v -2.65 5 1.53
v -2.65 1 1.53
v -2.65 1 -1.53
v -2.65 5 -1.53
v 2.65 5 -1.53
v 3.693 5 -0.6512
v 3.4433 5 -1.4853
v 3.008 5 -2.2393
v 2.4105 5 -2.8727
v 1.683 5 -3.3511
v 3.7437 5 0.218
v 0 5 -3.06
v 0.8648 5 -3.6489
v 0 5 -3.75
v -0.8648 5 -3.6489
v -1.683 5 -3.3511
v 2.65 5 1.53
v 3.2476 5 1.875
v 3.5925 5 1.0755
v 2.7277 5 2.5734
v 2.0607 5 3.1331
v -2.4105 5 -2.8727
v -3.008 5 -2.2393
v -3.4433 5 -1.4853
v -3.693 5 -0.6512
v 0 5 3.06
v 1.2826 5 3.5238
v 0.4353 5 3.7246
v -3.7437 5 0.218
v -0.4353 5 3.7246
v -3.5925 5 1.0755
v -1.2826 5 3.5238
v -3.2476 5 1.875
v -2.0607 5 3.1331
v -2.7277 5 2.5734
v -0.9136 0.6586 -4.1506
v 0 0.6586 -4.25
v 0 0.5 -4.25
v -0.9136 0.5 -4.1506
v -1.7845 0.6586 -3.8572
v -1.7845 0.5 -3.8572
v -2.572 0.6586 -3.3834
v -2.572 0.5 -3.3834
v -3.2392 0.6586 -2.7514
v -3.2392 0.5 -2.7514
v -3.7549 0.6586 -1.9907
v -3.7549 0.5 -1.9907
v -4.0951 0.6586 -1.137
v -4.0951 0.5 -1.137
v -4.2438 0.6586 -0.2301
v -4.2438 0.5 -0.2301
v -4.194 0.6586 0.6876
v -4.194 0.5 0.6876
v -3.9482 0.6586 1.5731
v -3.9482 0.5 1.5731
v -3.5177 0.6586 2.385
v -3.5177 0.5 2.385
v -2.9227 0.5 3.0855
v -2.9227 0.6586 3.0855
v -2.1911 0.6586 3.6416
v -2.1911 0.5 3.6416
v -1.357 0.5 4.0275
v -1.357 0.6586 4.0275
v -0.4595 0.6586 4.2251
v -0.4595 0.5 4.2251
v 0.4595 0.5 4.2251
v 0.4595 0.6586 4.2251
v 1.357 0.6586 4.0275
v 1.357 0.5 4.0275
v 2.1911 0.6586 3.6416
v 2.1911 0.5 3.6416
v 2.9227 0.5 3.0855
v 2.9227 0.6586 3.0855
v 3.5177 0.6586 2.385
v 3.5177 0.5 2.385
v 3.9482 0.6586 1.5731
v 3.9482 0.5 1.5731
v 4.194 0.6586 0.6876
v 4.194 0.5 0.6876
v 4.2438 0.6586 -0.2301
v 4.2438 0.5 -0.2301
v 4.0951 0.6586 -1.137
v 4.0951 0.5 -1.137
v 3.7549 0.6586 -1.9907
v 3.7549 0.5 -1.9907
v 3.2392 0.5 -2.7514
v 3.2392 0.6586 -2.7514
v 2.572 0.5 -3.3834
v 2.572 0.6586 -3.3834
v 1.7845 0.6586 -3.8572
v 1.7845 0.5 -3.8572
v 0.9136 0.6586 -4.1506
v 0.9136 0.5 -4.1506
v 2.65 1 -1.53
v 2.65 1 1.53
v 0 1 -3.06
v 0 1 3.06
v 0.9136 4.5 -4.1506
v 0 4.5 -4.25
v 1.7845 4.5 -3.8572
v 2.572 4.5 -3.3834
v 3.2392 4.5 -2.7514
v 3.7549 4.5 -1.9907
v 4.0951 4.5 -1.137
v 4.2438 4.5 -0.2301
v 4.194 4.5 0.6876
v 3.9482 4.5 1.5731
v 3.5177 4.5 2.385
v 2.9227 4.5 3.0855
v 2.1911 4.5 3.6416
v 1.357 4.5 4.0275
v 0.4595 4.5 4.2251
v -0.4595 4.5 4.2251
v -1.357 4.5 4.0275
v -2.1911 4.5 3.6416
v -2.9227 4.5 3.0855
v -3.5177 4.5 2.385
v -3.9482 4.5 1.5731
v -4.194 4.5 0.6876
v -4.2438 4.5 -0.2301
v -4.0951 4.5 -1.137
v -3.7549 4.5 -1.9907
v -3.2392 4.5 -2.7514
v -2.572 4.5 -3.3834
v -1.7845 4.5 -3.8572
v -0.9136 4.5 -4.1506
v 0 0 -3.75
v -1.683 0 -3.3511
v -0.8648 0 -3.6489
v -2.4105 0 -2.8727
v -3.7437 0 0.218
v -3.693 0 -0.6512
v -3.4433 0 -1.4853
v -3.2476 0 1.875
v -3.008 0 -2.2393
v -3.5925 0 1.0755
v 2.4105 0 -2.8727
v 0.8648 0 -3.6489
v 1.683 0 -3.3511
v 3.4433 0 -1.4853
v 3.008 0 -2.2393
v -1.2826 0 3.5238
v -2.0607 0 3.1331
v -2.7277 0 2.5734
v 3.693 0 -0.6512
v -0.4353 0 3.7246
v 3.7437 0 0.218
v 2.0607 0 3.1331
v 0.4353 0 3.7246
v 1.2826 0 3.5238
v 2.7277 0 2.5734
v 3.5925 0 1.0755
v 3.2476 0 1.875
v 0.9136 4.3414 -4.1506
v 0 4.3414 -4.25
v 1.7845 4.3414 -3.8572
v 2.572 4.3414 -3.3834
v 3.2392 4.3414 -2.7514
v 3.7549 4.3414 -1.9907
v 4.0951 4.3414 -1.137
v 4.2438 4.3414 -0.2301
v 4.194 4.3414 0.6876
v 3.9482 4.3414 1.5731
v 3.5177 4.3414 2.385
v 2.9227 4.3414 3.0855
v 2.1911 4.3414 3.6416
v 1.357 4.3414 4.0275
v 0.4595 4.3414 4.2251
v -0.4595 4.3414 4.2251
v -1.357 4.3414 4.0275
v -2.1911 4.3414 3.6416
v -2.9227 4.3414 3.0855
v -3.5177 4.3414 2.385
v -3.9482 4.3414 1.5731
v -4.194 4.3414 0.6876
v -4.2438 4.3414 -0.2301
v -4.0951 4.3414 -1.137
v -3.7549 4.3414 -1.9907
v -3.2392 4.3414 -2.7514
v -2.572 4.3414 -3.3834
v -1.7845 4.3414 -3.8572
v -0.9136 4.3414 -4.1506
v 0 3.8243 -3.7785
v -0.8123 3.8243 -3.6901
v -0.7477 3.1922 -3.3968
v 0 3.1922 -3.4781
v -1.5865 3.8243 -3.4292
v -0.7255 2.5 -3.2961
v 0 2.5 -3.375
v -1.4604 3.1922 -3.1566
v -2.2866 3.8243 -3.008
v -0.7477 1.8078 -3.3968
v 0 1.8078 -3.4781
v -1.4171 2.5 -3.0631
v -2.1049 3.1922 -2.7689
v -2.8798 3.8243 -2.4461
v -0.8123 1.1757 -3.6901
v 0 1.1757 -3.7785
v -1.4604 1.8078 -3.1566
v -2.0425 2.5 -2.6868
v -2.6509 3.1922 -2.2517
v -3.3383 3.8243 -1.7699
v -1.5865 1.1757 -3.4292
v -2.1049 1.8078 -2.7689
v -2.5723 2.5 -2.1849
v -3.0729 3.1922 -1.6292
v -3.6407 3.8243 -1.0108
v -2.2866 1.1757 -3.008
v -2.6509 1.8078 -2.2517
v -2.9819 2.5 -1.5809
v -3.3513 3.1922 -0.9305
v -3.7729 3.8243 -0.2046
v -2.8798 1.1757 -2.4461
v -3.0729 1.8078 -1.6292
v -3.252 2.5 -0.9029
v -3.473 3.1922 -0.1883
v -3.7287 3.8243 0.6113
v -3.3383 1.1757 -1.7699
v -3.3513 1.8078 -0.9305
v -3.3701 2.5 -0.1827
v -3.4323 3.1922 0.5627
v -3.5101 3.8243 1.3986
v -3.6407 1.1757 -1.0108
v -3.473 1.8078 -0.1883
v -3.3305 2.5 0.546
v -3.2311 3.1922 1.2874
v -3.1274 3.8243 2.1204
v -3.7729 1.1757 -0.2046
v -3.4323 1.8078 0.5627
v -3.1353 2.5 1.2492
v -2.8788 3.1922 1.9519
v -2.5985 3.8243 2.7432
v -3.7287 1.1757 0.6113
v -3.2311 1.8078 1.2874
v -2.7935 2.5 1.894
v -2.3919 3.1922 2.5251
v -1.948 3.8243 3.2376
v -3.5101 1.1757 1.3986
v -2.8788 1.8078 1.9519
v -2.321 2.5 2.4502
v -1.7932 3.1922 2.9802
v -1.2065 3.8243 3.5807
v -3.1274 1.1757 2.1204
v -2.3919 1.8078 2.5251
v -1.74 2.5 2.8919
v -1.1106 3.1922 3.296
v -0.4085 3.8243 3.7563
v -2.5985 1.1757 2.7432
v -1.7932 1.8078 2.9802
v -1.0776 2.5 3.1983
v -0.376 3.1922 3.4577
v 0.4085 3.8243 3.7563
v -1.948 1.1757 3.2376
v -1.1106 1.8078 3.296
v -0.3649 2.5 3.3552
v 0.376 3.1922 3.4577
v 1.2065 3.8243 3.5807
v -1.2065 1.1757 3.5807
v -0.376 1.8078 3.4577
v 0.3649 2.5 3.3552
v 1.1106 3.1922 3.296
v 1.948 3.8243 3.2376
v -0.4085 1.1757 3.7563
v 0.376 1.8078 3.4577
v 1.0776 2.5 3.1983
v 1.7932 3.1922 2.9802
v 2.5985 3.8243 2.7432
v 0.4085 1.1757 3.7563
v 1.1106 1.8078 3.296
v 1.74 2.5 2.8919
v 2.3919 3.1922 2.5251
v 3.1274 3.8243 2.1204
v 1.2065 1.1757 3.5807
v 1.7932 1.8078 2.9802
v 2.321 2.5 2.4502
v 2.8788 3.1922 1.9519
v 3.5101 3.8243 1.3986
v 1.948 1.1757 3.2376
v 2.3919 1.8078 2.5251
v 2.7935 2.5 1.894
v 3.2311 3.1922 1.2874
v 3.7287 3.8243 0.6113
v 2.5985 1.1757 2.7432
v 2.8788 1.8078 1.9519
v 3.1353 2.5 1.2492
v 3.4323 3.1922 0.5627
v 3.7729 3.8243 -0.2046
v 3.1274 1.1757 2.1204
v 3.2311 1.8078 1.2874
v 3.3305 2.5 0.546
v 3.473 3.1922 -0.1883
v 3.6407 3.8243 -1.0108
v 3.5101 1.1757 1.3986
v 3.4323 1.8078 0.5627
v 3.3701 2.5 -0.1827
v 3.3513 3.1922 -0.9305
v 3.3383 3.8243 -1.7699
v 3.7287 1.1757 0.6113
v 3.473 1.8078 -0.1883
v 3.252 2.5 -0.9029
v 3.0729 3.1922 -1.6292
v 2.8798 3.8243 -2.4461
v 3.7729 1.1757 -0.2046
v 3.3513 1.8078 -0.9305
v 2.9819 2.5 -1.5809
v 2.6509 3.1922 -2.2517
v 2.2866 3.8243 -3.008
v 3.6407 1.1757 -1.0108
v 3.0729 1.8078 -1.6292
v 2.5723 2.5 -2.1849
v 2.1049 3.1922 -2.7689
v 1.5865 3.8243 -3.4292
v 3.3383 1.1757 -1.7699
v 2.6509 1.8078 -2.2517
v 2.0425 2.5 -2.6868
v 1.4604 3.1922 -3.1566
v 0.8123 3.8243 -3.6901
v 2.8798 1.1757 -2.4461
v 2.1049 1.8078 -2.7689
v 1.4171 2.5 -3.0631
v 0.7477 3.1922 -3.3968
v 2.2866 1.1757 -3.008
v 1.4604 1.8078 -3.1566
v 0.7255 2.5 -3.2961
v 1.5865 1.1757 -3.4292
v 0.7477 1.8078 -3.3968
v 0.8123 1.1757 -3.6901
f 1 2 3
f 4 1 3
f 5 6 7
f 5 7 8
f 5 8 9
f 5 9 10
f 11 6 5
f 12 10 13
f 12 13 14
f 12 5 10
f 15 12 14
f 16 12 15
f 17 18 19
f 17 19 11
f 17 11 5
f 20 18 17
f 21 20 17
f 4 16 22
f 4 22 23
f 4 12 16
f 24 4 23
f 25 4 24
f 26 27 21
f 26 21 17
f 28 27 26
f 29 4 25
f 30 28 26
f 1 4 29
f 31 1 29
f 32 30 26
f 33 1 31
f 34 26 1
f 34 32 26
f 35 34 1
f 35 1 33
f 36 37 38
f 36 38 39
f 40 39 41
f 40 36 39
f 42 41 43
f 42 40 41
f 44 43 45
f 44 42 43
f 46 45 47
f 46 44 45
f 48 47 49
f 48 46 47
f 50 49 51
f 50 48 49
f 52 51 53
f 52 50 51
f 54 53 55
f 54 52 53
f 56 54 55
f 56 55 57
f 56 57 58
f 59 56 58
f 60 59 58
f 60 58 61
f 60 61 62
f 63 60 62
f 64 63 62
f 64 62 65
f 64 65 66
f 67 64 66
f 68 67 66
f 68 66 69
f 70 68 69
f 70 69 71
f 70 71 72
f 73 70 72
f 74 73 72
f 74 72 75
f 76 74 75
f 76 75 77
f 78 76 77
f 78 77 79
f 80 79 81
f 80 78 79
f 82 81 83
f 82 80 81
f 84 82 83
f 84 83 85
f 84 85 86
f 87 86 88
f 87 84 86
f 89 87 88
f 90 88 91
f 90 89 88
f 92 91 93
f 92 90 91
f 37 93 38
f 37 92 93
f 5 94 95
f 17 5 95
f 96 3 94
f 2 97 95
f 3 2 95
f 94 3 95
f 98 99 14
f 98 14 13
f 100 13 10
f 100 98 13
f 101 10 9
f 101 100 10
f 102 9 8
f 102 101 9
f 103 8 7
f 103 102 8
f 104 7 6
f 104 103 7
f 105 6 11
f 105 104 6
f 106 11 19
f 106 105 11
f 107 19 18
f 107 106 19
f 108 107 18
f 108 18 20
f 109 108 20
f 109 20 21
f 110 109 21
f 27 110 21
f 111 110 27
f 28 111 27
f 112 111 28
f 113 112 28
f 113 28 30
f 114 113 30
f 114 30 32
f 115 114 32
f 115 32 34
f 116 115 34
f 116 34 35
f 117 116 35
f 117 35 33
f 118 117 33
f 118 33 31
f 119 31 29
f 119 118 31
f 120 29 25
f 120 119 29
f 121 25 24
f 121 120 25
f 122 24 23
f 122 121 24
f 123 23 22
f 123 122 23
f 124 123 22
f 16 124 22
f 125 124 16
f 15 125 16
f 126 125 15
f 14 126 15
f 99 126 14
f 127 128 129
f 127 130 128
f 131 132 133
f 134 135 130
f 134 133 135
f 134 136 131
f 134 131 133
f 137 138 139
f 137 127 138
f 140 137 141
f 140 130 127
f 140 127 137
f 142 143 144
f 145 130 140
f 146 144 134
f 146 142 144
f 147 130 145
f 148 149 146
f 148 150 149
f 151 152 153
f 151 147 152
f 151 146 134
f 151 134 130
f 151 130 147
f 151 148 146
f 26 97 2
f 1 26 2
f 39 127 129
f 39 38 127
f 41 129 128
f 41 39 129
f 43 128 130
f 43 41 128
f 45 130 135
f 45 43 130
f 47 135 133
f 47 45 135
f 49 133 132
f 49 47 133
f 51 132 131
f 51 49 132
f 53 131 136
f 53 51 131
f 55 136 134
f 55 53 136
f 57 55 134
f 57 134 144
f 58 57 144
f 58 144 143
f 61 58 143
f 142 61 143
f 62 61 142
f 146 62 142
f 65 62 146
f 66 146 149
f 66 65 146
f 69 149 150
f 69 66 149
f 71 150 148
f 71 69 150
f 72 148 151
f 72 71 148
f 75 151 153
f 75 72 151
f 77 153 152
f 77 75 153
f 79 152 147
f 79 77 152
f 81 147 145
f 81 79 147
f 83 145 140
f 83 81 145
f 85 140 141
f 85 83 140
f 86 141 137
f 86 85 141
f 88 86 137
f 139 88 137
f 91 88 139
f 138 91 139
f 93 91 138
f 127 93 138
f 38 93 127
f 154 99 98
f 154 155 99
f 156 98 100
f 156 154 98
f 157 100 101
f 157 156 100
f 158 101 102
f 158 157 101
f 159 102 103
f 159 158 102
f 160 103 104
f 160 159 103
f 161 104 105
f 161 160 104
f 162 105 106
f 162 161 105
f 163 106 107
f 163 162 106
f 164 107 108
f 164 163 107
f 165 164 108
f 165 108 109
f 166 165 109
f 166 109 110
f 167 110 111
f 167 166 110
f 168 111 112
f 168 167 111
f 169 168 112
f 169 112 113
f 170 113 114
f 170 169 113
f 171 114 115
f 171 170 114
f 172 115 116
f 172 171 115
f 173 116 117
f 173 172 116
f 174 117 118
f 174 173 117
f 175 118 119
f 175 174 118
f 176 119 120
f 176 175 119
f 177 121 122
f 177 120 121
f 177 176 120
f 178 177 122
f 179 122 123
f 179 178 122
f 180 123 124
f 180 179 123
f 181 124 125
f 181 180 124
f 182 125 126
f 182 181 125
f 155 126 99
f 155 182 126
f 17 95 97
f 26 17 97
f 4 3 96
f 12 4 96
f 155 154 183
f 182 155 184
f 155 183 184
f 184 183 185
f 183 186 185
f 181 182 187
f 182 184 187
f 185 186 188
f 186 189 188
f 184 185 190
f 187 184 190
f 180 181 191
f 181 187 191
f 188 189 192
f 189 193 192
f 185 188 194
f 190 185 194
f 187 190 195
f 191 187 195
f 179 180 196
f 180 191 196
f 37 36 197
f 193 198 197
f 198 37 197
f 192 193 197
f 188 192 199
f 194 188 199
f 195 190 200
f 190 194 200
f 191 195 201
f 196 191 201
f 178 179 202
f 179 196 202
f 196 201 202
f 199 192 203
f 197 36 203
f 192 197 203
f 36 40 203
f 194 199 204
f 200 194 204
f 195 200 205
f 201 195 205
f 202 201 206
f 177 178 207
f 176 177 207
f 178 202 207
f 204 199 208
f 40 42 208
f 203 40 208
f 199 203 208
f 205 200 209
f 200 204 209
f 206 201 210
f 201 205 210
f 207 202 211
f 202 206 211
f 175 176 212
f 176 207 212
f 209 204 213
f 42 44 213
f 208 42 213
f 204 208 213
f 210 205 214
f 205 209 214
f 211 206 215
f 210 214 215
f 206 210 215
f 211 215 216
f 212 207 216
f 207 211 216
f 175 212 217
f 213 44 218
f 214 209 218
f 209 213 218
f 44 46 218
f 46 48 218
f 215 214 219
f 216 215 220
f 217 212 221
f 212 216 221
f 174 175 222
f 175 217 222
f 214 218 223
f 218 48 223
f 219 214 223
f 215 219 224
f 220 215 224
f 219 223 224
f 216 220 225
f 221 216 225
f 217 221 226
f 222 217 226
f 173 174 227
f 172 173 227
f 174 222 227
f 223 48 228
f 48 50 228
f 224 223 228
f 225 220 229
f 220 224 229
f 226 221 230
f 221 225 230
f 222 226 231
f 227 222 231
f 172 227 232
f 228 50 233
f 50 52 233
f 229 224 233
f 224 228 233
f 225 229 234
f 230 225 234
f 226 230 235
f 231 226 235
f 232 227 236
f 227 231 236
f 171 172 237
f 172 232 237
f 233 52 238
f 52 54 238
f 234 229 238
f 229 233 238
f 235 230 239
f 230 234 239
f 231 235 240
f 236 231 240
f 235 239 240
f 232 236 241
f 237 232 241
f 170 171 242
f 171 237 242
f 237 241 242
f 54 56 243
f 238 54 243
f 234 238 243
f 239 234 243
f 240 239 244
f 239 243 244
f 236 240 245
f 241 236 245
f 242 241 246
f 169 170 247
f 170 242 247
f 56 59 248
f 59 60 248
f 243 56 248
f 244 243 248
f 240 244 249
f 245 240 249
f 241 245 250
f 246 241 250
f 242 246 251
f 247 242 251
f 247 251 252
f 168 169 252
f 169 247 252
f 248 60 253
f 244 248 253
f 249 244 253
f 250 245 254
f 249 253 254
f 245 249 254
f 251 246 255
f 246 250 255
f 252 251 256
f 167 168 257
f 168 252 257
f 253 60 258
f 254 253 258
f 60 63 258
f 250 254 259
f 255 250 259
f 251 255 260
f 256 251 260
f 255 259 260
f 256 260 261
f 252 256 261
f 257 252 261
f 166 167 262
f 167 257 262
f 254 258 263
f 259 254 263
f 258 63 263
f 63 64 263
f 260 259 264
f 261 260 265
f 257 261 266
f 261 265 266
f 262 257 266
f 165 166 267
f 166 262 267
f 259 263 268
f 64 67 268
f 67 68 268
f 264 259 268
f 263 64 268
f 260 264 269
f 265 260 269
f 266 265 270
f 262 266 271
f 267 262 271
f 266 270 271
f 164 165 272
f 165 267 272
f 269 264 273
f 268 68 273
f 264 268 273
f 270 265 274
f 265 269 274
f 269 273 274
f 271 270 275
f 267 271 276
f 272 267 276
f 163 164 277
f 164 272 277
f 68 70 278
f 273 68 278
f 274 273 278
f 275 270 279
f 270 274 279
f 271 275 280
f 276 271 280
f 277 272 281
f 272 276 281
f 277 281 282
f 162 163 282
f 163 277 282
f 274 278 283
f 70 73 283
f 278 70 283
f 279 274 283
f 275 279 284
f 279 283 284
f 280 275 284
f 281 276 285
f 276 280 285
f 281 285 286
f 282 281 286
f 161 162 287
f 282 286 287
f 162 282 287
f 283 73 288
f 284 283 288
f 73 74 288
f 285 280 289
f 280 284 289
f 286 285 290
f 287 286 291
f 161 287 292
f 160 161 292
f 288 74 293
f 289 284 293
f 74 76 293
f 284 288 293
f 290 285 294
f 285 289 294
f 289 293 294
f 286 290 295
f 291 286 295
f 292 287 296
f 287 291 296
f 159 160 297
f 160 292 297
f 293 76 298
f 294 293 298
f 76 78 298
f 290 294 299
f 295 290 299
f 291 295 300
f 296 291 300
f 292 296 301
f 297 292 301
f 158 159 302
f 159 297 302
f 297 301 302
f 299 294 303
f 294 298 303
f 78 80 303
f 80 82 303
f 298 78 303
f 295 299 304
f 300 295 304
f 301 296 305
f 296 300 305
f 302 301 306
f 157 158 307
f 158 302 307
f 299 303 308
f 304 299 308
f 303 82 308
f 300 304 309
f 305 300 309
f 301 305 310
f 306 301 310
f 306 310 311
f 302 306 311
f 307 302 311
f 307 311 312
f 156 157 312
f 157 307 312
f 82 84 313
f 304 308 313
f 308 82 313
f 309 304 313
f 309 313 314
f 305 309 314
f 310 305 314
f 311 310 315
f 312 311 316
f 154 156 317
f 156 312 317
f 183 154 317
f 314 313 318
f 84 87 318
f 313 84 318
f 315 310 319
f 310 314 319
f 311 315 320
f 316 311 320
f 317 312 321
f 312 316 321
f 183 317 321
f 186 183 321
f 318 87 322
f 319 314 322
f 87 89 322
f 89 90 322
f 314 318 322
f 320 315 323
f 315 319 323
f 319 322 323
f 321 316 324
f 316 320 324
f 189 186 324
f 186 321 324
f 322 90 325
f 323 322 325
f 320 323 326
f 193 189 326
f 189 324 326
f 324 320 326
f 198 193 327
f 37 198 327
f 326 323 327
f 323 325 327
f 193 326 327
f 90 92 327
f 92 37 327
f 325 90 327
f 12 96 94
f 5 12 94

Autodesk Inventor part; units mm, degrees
ref_plane "YZ Plane" through (0, 0, 0) normal (1, 0, 0) x (0, 1, 0)
ref_plane "XZ Plane" through (0, 0, 0) normal (0, 1, 0) x (-1, 0, 0)
sketch "Sketch1" plane through (0, 0, 0) normal (0, 1, 0) x (-1, 0, 0)
  line L0 (2.65, -1.53) -> (0, -3.06)
  line L1 (0, -3.06) -> (-2.65, -1.53)
  line L2 (-2.65, -1.53) -> (-2.65, 1.53)
  line L3 (-2.65, 1.53) -> (0, 3.06)
  line L4 (0, 3.06) -> (2.65, 1.53)
  line L5 (2.65, 1.53) -> (2.65, -1.53)
  circle A0 centre (0, 0) radius 3.5
  dimension "d1" = 5.3
  dimension "d2" = 7
extrude "Extrusion1" add sketch "Sketch1" along normal blind 5
sketch "Sketch2" plane through (0, 0, 0) normal (1, 0, 0) x (0, 1, 0)
  line L0 (0, -3.5) -> (5, -3.5) projected
  circle A0 centre (2.5, -5.75) radius 2.375
  line L1 (5, -3.5) -> (5, 3.5) projected
  line L2 (5, -3.5) -> (5, -4.25)
  line L3 (5, -4.25) -> (4.3414, -4.25)
  line L4 (0, -3.5) -> (0, 3.5) projected
  line L5 (0, -3.5) -> (0, -4.25)
  line L6 (0, -4.25) -> (0.6586, -4.25)
  line L7 (-1, 0) -> (6, 0) projected
  point P0 (0, 0)
  point P1 (1.7397, -3.5)
  point P2 (3.2603, -3.5)
  dimension "d5" = 4.75
  dimension "d6" = 2.25
  dimension "d7" = 0.75
  dimension "d8" = 0.75
revolve "Revolution1" cut sketch "Sketch2" angle 360 about axis through (0, -10, 0) along (0, 1, 0) contours A0 L0 | L0 A0
revolve "Revolution2" add sketch "Sketch2" angle 360 about axis through (0, -10, 0) along (0, 1, 0) contours L0 A0 L6 L5 | L0 L2 L3 A0
chamfer "Chamfer1" distance 0.5 angle 45 2 edges at (0, 5, 4.25) (0, 0, 4.25)
ref_plane "Work Plane1" through (0, 2.5, 0) normal (0, 1, 0) x (1, 0, 0)
sketch "Sketch3" plane through (0, 0, 0) normal (0, -1, 0) x (1, 0, 0)
  line L0 (-2.65, -1.53) -> (0, -3.06) projected
  line L1 (-2.65, 1.53) -> (-2.65, -1.53) projected
  line L2 (0, 3.06) -> (-2.65, 1.53) projected
  line L3 (2.65, 1.53) -> (0, 3.06) projected
  line L4 (2.65, -1.53) -> (2.65, 1.53) projected
  line L5 (0, -3.06) -> (2.65, -1.53) projected
  circle A0 centre (0, 0) radius 3.75 projected
extrude "Extrusion2" add sketch "Sketch3" against normal blind 1 contours L1 L2 L3 L4 L5 L0
properties part number "5mm Hex Bearing Inside Blocker"
